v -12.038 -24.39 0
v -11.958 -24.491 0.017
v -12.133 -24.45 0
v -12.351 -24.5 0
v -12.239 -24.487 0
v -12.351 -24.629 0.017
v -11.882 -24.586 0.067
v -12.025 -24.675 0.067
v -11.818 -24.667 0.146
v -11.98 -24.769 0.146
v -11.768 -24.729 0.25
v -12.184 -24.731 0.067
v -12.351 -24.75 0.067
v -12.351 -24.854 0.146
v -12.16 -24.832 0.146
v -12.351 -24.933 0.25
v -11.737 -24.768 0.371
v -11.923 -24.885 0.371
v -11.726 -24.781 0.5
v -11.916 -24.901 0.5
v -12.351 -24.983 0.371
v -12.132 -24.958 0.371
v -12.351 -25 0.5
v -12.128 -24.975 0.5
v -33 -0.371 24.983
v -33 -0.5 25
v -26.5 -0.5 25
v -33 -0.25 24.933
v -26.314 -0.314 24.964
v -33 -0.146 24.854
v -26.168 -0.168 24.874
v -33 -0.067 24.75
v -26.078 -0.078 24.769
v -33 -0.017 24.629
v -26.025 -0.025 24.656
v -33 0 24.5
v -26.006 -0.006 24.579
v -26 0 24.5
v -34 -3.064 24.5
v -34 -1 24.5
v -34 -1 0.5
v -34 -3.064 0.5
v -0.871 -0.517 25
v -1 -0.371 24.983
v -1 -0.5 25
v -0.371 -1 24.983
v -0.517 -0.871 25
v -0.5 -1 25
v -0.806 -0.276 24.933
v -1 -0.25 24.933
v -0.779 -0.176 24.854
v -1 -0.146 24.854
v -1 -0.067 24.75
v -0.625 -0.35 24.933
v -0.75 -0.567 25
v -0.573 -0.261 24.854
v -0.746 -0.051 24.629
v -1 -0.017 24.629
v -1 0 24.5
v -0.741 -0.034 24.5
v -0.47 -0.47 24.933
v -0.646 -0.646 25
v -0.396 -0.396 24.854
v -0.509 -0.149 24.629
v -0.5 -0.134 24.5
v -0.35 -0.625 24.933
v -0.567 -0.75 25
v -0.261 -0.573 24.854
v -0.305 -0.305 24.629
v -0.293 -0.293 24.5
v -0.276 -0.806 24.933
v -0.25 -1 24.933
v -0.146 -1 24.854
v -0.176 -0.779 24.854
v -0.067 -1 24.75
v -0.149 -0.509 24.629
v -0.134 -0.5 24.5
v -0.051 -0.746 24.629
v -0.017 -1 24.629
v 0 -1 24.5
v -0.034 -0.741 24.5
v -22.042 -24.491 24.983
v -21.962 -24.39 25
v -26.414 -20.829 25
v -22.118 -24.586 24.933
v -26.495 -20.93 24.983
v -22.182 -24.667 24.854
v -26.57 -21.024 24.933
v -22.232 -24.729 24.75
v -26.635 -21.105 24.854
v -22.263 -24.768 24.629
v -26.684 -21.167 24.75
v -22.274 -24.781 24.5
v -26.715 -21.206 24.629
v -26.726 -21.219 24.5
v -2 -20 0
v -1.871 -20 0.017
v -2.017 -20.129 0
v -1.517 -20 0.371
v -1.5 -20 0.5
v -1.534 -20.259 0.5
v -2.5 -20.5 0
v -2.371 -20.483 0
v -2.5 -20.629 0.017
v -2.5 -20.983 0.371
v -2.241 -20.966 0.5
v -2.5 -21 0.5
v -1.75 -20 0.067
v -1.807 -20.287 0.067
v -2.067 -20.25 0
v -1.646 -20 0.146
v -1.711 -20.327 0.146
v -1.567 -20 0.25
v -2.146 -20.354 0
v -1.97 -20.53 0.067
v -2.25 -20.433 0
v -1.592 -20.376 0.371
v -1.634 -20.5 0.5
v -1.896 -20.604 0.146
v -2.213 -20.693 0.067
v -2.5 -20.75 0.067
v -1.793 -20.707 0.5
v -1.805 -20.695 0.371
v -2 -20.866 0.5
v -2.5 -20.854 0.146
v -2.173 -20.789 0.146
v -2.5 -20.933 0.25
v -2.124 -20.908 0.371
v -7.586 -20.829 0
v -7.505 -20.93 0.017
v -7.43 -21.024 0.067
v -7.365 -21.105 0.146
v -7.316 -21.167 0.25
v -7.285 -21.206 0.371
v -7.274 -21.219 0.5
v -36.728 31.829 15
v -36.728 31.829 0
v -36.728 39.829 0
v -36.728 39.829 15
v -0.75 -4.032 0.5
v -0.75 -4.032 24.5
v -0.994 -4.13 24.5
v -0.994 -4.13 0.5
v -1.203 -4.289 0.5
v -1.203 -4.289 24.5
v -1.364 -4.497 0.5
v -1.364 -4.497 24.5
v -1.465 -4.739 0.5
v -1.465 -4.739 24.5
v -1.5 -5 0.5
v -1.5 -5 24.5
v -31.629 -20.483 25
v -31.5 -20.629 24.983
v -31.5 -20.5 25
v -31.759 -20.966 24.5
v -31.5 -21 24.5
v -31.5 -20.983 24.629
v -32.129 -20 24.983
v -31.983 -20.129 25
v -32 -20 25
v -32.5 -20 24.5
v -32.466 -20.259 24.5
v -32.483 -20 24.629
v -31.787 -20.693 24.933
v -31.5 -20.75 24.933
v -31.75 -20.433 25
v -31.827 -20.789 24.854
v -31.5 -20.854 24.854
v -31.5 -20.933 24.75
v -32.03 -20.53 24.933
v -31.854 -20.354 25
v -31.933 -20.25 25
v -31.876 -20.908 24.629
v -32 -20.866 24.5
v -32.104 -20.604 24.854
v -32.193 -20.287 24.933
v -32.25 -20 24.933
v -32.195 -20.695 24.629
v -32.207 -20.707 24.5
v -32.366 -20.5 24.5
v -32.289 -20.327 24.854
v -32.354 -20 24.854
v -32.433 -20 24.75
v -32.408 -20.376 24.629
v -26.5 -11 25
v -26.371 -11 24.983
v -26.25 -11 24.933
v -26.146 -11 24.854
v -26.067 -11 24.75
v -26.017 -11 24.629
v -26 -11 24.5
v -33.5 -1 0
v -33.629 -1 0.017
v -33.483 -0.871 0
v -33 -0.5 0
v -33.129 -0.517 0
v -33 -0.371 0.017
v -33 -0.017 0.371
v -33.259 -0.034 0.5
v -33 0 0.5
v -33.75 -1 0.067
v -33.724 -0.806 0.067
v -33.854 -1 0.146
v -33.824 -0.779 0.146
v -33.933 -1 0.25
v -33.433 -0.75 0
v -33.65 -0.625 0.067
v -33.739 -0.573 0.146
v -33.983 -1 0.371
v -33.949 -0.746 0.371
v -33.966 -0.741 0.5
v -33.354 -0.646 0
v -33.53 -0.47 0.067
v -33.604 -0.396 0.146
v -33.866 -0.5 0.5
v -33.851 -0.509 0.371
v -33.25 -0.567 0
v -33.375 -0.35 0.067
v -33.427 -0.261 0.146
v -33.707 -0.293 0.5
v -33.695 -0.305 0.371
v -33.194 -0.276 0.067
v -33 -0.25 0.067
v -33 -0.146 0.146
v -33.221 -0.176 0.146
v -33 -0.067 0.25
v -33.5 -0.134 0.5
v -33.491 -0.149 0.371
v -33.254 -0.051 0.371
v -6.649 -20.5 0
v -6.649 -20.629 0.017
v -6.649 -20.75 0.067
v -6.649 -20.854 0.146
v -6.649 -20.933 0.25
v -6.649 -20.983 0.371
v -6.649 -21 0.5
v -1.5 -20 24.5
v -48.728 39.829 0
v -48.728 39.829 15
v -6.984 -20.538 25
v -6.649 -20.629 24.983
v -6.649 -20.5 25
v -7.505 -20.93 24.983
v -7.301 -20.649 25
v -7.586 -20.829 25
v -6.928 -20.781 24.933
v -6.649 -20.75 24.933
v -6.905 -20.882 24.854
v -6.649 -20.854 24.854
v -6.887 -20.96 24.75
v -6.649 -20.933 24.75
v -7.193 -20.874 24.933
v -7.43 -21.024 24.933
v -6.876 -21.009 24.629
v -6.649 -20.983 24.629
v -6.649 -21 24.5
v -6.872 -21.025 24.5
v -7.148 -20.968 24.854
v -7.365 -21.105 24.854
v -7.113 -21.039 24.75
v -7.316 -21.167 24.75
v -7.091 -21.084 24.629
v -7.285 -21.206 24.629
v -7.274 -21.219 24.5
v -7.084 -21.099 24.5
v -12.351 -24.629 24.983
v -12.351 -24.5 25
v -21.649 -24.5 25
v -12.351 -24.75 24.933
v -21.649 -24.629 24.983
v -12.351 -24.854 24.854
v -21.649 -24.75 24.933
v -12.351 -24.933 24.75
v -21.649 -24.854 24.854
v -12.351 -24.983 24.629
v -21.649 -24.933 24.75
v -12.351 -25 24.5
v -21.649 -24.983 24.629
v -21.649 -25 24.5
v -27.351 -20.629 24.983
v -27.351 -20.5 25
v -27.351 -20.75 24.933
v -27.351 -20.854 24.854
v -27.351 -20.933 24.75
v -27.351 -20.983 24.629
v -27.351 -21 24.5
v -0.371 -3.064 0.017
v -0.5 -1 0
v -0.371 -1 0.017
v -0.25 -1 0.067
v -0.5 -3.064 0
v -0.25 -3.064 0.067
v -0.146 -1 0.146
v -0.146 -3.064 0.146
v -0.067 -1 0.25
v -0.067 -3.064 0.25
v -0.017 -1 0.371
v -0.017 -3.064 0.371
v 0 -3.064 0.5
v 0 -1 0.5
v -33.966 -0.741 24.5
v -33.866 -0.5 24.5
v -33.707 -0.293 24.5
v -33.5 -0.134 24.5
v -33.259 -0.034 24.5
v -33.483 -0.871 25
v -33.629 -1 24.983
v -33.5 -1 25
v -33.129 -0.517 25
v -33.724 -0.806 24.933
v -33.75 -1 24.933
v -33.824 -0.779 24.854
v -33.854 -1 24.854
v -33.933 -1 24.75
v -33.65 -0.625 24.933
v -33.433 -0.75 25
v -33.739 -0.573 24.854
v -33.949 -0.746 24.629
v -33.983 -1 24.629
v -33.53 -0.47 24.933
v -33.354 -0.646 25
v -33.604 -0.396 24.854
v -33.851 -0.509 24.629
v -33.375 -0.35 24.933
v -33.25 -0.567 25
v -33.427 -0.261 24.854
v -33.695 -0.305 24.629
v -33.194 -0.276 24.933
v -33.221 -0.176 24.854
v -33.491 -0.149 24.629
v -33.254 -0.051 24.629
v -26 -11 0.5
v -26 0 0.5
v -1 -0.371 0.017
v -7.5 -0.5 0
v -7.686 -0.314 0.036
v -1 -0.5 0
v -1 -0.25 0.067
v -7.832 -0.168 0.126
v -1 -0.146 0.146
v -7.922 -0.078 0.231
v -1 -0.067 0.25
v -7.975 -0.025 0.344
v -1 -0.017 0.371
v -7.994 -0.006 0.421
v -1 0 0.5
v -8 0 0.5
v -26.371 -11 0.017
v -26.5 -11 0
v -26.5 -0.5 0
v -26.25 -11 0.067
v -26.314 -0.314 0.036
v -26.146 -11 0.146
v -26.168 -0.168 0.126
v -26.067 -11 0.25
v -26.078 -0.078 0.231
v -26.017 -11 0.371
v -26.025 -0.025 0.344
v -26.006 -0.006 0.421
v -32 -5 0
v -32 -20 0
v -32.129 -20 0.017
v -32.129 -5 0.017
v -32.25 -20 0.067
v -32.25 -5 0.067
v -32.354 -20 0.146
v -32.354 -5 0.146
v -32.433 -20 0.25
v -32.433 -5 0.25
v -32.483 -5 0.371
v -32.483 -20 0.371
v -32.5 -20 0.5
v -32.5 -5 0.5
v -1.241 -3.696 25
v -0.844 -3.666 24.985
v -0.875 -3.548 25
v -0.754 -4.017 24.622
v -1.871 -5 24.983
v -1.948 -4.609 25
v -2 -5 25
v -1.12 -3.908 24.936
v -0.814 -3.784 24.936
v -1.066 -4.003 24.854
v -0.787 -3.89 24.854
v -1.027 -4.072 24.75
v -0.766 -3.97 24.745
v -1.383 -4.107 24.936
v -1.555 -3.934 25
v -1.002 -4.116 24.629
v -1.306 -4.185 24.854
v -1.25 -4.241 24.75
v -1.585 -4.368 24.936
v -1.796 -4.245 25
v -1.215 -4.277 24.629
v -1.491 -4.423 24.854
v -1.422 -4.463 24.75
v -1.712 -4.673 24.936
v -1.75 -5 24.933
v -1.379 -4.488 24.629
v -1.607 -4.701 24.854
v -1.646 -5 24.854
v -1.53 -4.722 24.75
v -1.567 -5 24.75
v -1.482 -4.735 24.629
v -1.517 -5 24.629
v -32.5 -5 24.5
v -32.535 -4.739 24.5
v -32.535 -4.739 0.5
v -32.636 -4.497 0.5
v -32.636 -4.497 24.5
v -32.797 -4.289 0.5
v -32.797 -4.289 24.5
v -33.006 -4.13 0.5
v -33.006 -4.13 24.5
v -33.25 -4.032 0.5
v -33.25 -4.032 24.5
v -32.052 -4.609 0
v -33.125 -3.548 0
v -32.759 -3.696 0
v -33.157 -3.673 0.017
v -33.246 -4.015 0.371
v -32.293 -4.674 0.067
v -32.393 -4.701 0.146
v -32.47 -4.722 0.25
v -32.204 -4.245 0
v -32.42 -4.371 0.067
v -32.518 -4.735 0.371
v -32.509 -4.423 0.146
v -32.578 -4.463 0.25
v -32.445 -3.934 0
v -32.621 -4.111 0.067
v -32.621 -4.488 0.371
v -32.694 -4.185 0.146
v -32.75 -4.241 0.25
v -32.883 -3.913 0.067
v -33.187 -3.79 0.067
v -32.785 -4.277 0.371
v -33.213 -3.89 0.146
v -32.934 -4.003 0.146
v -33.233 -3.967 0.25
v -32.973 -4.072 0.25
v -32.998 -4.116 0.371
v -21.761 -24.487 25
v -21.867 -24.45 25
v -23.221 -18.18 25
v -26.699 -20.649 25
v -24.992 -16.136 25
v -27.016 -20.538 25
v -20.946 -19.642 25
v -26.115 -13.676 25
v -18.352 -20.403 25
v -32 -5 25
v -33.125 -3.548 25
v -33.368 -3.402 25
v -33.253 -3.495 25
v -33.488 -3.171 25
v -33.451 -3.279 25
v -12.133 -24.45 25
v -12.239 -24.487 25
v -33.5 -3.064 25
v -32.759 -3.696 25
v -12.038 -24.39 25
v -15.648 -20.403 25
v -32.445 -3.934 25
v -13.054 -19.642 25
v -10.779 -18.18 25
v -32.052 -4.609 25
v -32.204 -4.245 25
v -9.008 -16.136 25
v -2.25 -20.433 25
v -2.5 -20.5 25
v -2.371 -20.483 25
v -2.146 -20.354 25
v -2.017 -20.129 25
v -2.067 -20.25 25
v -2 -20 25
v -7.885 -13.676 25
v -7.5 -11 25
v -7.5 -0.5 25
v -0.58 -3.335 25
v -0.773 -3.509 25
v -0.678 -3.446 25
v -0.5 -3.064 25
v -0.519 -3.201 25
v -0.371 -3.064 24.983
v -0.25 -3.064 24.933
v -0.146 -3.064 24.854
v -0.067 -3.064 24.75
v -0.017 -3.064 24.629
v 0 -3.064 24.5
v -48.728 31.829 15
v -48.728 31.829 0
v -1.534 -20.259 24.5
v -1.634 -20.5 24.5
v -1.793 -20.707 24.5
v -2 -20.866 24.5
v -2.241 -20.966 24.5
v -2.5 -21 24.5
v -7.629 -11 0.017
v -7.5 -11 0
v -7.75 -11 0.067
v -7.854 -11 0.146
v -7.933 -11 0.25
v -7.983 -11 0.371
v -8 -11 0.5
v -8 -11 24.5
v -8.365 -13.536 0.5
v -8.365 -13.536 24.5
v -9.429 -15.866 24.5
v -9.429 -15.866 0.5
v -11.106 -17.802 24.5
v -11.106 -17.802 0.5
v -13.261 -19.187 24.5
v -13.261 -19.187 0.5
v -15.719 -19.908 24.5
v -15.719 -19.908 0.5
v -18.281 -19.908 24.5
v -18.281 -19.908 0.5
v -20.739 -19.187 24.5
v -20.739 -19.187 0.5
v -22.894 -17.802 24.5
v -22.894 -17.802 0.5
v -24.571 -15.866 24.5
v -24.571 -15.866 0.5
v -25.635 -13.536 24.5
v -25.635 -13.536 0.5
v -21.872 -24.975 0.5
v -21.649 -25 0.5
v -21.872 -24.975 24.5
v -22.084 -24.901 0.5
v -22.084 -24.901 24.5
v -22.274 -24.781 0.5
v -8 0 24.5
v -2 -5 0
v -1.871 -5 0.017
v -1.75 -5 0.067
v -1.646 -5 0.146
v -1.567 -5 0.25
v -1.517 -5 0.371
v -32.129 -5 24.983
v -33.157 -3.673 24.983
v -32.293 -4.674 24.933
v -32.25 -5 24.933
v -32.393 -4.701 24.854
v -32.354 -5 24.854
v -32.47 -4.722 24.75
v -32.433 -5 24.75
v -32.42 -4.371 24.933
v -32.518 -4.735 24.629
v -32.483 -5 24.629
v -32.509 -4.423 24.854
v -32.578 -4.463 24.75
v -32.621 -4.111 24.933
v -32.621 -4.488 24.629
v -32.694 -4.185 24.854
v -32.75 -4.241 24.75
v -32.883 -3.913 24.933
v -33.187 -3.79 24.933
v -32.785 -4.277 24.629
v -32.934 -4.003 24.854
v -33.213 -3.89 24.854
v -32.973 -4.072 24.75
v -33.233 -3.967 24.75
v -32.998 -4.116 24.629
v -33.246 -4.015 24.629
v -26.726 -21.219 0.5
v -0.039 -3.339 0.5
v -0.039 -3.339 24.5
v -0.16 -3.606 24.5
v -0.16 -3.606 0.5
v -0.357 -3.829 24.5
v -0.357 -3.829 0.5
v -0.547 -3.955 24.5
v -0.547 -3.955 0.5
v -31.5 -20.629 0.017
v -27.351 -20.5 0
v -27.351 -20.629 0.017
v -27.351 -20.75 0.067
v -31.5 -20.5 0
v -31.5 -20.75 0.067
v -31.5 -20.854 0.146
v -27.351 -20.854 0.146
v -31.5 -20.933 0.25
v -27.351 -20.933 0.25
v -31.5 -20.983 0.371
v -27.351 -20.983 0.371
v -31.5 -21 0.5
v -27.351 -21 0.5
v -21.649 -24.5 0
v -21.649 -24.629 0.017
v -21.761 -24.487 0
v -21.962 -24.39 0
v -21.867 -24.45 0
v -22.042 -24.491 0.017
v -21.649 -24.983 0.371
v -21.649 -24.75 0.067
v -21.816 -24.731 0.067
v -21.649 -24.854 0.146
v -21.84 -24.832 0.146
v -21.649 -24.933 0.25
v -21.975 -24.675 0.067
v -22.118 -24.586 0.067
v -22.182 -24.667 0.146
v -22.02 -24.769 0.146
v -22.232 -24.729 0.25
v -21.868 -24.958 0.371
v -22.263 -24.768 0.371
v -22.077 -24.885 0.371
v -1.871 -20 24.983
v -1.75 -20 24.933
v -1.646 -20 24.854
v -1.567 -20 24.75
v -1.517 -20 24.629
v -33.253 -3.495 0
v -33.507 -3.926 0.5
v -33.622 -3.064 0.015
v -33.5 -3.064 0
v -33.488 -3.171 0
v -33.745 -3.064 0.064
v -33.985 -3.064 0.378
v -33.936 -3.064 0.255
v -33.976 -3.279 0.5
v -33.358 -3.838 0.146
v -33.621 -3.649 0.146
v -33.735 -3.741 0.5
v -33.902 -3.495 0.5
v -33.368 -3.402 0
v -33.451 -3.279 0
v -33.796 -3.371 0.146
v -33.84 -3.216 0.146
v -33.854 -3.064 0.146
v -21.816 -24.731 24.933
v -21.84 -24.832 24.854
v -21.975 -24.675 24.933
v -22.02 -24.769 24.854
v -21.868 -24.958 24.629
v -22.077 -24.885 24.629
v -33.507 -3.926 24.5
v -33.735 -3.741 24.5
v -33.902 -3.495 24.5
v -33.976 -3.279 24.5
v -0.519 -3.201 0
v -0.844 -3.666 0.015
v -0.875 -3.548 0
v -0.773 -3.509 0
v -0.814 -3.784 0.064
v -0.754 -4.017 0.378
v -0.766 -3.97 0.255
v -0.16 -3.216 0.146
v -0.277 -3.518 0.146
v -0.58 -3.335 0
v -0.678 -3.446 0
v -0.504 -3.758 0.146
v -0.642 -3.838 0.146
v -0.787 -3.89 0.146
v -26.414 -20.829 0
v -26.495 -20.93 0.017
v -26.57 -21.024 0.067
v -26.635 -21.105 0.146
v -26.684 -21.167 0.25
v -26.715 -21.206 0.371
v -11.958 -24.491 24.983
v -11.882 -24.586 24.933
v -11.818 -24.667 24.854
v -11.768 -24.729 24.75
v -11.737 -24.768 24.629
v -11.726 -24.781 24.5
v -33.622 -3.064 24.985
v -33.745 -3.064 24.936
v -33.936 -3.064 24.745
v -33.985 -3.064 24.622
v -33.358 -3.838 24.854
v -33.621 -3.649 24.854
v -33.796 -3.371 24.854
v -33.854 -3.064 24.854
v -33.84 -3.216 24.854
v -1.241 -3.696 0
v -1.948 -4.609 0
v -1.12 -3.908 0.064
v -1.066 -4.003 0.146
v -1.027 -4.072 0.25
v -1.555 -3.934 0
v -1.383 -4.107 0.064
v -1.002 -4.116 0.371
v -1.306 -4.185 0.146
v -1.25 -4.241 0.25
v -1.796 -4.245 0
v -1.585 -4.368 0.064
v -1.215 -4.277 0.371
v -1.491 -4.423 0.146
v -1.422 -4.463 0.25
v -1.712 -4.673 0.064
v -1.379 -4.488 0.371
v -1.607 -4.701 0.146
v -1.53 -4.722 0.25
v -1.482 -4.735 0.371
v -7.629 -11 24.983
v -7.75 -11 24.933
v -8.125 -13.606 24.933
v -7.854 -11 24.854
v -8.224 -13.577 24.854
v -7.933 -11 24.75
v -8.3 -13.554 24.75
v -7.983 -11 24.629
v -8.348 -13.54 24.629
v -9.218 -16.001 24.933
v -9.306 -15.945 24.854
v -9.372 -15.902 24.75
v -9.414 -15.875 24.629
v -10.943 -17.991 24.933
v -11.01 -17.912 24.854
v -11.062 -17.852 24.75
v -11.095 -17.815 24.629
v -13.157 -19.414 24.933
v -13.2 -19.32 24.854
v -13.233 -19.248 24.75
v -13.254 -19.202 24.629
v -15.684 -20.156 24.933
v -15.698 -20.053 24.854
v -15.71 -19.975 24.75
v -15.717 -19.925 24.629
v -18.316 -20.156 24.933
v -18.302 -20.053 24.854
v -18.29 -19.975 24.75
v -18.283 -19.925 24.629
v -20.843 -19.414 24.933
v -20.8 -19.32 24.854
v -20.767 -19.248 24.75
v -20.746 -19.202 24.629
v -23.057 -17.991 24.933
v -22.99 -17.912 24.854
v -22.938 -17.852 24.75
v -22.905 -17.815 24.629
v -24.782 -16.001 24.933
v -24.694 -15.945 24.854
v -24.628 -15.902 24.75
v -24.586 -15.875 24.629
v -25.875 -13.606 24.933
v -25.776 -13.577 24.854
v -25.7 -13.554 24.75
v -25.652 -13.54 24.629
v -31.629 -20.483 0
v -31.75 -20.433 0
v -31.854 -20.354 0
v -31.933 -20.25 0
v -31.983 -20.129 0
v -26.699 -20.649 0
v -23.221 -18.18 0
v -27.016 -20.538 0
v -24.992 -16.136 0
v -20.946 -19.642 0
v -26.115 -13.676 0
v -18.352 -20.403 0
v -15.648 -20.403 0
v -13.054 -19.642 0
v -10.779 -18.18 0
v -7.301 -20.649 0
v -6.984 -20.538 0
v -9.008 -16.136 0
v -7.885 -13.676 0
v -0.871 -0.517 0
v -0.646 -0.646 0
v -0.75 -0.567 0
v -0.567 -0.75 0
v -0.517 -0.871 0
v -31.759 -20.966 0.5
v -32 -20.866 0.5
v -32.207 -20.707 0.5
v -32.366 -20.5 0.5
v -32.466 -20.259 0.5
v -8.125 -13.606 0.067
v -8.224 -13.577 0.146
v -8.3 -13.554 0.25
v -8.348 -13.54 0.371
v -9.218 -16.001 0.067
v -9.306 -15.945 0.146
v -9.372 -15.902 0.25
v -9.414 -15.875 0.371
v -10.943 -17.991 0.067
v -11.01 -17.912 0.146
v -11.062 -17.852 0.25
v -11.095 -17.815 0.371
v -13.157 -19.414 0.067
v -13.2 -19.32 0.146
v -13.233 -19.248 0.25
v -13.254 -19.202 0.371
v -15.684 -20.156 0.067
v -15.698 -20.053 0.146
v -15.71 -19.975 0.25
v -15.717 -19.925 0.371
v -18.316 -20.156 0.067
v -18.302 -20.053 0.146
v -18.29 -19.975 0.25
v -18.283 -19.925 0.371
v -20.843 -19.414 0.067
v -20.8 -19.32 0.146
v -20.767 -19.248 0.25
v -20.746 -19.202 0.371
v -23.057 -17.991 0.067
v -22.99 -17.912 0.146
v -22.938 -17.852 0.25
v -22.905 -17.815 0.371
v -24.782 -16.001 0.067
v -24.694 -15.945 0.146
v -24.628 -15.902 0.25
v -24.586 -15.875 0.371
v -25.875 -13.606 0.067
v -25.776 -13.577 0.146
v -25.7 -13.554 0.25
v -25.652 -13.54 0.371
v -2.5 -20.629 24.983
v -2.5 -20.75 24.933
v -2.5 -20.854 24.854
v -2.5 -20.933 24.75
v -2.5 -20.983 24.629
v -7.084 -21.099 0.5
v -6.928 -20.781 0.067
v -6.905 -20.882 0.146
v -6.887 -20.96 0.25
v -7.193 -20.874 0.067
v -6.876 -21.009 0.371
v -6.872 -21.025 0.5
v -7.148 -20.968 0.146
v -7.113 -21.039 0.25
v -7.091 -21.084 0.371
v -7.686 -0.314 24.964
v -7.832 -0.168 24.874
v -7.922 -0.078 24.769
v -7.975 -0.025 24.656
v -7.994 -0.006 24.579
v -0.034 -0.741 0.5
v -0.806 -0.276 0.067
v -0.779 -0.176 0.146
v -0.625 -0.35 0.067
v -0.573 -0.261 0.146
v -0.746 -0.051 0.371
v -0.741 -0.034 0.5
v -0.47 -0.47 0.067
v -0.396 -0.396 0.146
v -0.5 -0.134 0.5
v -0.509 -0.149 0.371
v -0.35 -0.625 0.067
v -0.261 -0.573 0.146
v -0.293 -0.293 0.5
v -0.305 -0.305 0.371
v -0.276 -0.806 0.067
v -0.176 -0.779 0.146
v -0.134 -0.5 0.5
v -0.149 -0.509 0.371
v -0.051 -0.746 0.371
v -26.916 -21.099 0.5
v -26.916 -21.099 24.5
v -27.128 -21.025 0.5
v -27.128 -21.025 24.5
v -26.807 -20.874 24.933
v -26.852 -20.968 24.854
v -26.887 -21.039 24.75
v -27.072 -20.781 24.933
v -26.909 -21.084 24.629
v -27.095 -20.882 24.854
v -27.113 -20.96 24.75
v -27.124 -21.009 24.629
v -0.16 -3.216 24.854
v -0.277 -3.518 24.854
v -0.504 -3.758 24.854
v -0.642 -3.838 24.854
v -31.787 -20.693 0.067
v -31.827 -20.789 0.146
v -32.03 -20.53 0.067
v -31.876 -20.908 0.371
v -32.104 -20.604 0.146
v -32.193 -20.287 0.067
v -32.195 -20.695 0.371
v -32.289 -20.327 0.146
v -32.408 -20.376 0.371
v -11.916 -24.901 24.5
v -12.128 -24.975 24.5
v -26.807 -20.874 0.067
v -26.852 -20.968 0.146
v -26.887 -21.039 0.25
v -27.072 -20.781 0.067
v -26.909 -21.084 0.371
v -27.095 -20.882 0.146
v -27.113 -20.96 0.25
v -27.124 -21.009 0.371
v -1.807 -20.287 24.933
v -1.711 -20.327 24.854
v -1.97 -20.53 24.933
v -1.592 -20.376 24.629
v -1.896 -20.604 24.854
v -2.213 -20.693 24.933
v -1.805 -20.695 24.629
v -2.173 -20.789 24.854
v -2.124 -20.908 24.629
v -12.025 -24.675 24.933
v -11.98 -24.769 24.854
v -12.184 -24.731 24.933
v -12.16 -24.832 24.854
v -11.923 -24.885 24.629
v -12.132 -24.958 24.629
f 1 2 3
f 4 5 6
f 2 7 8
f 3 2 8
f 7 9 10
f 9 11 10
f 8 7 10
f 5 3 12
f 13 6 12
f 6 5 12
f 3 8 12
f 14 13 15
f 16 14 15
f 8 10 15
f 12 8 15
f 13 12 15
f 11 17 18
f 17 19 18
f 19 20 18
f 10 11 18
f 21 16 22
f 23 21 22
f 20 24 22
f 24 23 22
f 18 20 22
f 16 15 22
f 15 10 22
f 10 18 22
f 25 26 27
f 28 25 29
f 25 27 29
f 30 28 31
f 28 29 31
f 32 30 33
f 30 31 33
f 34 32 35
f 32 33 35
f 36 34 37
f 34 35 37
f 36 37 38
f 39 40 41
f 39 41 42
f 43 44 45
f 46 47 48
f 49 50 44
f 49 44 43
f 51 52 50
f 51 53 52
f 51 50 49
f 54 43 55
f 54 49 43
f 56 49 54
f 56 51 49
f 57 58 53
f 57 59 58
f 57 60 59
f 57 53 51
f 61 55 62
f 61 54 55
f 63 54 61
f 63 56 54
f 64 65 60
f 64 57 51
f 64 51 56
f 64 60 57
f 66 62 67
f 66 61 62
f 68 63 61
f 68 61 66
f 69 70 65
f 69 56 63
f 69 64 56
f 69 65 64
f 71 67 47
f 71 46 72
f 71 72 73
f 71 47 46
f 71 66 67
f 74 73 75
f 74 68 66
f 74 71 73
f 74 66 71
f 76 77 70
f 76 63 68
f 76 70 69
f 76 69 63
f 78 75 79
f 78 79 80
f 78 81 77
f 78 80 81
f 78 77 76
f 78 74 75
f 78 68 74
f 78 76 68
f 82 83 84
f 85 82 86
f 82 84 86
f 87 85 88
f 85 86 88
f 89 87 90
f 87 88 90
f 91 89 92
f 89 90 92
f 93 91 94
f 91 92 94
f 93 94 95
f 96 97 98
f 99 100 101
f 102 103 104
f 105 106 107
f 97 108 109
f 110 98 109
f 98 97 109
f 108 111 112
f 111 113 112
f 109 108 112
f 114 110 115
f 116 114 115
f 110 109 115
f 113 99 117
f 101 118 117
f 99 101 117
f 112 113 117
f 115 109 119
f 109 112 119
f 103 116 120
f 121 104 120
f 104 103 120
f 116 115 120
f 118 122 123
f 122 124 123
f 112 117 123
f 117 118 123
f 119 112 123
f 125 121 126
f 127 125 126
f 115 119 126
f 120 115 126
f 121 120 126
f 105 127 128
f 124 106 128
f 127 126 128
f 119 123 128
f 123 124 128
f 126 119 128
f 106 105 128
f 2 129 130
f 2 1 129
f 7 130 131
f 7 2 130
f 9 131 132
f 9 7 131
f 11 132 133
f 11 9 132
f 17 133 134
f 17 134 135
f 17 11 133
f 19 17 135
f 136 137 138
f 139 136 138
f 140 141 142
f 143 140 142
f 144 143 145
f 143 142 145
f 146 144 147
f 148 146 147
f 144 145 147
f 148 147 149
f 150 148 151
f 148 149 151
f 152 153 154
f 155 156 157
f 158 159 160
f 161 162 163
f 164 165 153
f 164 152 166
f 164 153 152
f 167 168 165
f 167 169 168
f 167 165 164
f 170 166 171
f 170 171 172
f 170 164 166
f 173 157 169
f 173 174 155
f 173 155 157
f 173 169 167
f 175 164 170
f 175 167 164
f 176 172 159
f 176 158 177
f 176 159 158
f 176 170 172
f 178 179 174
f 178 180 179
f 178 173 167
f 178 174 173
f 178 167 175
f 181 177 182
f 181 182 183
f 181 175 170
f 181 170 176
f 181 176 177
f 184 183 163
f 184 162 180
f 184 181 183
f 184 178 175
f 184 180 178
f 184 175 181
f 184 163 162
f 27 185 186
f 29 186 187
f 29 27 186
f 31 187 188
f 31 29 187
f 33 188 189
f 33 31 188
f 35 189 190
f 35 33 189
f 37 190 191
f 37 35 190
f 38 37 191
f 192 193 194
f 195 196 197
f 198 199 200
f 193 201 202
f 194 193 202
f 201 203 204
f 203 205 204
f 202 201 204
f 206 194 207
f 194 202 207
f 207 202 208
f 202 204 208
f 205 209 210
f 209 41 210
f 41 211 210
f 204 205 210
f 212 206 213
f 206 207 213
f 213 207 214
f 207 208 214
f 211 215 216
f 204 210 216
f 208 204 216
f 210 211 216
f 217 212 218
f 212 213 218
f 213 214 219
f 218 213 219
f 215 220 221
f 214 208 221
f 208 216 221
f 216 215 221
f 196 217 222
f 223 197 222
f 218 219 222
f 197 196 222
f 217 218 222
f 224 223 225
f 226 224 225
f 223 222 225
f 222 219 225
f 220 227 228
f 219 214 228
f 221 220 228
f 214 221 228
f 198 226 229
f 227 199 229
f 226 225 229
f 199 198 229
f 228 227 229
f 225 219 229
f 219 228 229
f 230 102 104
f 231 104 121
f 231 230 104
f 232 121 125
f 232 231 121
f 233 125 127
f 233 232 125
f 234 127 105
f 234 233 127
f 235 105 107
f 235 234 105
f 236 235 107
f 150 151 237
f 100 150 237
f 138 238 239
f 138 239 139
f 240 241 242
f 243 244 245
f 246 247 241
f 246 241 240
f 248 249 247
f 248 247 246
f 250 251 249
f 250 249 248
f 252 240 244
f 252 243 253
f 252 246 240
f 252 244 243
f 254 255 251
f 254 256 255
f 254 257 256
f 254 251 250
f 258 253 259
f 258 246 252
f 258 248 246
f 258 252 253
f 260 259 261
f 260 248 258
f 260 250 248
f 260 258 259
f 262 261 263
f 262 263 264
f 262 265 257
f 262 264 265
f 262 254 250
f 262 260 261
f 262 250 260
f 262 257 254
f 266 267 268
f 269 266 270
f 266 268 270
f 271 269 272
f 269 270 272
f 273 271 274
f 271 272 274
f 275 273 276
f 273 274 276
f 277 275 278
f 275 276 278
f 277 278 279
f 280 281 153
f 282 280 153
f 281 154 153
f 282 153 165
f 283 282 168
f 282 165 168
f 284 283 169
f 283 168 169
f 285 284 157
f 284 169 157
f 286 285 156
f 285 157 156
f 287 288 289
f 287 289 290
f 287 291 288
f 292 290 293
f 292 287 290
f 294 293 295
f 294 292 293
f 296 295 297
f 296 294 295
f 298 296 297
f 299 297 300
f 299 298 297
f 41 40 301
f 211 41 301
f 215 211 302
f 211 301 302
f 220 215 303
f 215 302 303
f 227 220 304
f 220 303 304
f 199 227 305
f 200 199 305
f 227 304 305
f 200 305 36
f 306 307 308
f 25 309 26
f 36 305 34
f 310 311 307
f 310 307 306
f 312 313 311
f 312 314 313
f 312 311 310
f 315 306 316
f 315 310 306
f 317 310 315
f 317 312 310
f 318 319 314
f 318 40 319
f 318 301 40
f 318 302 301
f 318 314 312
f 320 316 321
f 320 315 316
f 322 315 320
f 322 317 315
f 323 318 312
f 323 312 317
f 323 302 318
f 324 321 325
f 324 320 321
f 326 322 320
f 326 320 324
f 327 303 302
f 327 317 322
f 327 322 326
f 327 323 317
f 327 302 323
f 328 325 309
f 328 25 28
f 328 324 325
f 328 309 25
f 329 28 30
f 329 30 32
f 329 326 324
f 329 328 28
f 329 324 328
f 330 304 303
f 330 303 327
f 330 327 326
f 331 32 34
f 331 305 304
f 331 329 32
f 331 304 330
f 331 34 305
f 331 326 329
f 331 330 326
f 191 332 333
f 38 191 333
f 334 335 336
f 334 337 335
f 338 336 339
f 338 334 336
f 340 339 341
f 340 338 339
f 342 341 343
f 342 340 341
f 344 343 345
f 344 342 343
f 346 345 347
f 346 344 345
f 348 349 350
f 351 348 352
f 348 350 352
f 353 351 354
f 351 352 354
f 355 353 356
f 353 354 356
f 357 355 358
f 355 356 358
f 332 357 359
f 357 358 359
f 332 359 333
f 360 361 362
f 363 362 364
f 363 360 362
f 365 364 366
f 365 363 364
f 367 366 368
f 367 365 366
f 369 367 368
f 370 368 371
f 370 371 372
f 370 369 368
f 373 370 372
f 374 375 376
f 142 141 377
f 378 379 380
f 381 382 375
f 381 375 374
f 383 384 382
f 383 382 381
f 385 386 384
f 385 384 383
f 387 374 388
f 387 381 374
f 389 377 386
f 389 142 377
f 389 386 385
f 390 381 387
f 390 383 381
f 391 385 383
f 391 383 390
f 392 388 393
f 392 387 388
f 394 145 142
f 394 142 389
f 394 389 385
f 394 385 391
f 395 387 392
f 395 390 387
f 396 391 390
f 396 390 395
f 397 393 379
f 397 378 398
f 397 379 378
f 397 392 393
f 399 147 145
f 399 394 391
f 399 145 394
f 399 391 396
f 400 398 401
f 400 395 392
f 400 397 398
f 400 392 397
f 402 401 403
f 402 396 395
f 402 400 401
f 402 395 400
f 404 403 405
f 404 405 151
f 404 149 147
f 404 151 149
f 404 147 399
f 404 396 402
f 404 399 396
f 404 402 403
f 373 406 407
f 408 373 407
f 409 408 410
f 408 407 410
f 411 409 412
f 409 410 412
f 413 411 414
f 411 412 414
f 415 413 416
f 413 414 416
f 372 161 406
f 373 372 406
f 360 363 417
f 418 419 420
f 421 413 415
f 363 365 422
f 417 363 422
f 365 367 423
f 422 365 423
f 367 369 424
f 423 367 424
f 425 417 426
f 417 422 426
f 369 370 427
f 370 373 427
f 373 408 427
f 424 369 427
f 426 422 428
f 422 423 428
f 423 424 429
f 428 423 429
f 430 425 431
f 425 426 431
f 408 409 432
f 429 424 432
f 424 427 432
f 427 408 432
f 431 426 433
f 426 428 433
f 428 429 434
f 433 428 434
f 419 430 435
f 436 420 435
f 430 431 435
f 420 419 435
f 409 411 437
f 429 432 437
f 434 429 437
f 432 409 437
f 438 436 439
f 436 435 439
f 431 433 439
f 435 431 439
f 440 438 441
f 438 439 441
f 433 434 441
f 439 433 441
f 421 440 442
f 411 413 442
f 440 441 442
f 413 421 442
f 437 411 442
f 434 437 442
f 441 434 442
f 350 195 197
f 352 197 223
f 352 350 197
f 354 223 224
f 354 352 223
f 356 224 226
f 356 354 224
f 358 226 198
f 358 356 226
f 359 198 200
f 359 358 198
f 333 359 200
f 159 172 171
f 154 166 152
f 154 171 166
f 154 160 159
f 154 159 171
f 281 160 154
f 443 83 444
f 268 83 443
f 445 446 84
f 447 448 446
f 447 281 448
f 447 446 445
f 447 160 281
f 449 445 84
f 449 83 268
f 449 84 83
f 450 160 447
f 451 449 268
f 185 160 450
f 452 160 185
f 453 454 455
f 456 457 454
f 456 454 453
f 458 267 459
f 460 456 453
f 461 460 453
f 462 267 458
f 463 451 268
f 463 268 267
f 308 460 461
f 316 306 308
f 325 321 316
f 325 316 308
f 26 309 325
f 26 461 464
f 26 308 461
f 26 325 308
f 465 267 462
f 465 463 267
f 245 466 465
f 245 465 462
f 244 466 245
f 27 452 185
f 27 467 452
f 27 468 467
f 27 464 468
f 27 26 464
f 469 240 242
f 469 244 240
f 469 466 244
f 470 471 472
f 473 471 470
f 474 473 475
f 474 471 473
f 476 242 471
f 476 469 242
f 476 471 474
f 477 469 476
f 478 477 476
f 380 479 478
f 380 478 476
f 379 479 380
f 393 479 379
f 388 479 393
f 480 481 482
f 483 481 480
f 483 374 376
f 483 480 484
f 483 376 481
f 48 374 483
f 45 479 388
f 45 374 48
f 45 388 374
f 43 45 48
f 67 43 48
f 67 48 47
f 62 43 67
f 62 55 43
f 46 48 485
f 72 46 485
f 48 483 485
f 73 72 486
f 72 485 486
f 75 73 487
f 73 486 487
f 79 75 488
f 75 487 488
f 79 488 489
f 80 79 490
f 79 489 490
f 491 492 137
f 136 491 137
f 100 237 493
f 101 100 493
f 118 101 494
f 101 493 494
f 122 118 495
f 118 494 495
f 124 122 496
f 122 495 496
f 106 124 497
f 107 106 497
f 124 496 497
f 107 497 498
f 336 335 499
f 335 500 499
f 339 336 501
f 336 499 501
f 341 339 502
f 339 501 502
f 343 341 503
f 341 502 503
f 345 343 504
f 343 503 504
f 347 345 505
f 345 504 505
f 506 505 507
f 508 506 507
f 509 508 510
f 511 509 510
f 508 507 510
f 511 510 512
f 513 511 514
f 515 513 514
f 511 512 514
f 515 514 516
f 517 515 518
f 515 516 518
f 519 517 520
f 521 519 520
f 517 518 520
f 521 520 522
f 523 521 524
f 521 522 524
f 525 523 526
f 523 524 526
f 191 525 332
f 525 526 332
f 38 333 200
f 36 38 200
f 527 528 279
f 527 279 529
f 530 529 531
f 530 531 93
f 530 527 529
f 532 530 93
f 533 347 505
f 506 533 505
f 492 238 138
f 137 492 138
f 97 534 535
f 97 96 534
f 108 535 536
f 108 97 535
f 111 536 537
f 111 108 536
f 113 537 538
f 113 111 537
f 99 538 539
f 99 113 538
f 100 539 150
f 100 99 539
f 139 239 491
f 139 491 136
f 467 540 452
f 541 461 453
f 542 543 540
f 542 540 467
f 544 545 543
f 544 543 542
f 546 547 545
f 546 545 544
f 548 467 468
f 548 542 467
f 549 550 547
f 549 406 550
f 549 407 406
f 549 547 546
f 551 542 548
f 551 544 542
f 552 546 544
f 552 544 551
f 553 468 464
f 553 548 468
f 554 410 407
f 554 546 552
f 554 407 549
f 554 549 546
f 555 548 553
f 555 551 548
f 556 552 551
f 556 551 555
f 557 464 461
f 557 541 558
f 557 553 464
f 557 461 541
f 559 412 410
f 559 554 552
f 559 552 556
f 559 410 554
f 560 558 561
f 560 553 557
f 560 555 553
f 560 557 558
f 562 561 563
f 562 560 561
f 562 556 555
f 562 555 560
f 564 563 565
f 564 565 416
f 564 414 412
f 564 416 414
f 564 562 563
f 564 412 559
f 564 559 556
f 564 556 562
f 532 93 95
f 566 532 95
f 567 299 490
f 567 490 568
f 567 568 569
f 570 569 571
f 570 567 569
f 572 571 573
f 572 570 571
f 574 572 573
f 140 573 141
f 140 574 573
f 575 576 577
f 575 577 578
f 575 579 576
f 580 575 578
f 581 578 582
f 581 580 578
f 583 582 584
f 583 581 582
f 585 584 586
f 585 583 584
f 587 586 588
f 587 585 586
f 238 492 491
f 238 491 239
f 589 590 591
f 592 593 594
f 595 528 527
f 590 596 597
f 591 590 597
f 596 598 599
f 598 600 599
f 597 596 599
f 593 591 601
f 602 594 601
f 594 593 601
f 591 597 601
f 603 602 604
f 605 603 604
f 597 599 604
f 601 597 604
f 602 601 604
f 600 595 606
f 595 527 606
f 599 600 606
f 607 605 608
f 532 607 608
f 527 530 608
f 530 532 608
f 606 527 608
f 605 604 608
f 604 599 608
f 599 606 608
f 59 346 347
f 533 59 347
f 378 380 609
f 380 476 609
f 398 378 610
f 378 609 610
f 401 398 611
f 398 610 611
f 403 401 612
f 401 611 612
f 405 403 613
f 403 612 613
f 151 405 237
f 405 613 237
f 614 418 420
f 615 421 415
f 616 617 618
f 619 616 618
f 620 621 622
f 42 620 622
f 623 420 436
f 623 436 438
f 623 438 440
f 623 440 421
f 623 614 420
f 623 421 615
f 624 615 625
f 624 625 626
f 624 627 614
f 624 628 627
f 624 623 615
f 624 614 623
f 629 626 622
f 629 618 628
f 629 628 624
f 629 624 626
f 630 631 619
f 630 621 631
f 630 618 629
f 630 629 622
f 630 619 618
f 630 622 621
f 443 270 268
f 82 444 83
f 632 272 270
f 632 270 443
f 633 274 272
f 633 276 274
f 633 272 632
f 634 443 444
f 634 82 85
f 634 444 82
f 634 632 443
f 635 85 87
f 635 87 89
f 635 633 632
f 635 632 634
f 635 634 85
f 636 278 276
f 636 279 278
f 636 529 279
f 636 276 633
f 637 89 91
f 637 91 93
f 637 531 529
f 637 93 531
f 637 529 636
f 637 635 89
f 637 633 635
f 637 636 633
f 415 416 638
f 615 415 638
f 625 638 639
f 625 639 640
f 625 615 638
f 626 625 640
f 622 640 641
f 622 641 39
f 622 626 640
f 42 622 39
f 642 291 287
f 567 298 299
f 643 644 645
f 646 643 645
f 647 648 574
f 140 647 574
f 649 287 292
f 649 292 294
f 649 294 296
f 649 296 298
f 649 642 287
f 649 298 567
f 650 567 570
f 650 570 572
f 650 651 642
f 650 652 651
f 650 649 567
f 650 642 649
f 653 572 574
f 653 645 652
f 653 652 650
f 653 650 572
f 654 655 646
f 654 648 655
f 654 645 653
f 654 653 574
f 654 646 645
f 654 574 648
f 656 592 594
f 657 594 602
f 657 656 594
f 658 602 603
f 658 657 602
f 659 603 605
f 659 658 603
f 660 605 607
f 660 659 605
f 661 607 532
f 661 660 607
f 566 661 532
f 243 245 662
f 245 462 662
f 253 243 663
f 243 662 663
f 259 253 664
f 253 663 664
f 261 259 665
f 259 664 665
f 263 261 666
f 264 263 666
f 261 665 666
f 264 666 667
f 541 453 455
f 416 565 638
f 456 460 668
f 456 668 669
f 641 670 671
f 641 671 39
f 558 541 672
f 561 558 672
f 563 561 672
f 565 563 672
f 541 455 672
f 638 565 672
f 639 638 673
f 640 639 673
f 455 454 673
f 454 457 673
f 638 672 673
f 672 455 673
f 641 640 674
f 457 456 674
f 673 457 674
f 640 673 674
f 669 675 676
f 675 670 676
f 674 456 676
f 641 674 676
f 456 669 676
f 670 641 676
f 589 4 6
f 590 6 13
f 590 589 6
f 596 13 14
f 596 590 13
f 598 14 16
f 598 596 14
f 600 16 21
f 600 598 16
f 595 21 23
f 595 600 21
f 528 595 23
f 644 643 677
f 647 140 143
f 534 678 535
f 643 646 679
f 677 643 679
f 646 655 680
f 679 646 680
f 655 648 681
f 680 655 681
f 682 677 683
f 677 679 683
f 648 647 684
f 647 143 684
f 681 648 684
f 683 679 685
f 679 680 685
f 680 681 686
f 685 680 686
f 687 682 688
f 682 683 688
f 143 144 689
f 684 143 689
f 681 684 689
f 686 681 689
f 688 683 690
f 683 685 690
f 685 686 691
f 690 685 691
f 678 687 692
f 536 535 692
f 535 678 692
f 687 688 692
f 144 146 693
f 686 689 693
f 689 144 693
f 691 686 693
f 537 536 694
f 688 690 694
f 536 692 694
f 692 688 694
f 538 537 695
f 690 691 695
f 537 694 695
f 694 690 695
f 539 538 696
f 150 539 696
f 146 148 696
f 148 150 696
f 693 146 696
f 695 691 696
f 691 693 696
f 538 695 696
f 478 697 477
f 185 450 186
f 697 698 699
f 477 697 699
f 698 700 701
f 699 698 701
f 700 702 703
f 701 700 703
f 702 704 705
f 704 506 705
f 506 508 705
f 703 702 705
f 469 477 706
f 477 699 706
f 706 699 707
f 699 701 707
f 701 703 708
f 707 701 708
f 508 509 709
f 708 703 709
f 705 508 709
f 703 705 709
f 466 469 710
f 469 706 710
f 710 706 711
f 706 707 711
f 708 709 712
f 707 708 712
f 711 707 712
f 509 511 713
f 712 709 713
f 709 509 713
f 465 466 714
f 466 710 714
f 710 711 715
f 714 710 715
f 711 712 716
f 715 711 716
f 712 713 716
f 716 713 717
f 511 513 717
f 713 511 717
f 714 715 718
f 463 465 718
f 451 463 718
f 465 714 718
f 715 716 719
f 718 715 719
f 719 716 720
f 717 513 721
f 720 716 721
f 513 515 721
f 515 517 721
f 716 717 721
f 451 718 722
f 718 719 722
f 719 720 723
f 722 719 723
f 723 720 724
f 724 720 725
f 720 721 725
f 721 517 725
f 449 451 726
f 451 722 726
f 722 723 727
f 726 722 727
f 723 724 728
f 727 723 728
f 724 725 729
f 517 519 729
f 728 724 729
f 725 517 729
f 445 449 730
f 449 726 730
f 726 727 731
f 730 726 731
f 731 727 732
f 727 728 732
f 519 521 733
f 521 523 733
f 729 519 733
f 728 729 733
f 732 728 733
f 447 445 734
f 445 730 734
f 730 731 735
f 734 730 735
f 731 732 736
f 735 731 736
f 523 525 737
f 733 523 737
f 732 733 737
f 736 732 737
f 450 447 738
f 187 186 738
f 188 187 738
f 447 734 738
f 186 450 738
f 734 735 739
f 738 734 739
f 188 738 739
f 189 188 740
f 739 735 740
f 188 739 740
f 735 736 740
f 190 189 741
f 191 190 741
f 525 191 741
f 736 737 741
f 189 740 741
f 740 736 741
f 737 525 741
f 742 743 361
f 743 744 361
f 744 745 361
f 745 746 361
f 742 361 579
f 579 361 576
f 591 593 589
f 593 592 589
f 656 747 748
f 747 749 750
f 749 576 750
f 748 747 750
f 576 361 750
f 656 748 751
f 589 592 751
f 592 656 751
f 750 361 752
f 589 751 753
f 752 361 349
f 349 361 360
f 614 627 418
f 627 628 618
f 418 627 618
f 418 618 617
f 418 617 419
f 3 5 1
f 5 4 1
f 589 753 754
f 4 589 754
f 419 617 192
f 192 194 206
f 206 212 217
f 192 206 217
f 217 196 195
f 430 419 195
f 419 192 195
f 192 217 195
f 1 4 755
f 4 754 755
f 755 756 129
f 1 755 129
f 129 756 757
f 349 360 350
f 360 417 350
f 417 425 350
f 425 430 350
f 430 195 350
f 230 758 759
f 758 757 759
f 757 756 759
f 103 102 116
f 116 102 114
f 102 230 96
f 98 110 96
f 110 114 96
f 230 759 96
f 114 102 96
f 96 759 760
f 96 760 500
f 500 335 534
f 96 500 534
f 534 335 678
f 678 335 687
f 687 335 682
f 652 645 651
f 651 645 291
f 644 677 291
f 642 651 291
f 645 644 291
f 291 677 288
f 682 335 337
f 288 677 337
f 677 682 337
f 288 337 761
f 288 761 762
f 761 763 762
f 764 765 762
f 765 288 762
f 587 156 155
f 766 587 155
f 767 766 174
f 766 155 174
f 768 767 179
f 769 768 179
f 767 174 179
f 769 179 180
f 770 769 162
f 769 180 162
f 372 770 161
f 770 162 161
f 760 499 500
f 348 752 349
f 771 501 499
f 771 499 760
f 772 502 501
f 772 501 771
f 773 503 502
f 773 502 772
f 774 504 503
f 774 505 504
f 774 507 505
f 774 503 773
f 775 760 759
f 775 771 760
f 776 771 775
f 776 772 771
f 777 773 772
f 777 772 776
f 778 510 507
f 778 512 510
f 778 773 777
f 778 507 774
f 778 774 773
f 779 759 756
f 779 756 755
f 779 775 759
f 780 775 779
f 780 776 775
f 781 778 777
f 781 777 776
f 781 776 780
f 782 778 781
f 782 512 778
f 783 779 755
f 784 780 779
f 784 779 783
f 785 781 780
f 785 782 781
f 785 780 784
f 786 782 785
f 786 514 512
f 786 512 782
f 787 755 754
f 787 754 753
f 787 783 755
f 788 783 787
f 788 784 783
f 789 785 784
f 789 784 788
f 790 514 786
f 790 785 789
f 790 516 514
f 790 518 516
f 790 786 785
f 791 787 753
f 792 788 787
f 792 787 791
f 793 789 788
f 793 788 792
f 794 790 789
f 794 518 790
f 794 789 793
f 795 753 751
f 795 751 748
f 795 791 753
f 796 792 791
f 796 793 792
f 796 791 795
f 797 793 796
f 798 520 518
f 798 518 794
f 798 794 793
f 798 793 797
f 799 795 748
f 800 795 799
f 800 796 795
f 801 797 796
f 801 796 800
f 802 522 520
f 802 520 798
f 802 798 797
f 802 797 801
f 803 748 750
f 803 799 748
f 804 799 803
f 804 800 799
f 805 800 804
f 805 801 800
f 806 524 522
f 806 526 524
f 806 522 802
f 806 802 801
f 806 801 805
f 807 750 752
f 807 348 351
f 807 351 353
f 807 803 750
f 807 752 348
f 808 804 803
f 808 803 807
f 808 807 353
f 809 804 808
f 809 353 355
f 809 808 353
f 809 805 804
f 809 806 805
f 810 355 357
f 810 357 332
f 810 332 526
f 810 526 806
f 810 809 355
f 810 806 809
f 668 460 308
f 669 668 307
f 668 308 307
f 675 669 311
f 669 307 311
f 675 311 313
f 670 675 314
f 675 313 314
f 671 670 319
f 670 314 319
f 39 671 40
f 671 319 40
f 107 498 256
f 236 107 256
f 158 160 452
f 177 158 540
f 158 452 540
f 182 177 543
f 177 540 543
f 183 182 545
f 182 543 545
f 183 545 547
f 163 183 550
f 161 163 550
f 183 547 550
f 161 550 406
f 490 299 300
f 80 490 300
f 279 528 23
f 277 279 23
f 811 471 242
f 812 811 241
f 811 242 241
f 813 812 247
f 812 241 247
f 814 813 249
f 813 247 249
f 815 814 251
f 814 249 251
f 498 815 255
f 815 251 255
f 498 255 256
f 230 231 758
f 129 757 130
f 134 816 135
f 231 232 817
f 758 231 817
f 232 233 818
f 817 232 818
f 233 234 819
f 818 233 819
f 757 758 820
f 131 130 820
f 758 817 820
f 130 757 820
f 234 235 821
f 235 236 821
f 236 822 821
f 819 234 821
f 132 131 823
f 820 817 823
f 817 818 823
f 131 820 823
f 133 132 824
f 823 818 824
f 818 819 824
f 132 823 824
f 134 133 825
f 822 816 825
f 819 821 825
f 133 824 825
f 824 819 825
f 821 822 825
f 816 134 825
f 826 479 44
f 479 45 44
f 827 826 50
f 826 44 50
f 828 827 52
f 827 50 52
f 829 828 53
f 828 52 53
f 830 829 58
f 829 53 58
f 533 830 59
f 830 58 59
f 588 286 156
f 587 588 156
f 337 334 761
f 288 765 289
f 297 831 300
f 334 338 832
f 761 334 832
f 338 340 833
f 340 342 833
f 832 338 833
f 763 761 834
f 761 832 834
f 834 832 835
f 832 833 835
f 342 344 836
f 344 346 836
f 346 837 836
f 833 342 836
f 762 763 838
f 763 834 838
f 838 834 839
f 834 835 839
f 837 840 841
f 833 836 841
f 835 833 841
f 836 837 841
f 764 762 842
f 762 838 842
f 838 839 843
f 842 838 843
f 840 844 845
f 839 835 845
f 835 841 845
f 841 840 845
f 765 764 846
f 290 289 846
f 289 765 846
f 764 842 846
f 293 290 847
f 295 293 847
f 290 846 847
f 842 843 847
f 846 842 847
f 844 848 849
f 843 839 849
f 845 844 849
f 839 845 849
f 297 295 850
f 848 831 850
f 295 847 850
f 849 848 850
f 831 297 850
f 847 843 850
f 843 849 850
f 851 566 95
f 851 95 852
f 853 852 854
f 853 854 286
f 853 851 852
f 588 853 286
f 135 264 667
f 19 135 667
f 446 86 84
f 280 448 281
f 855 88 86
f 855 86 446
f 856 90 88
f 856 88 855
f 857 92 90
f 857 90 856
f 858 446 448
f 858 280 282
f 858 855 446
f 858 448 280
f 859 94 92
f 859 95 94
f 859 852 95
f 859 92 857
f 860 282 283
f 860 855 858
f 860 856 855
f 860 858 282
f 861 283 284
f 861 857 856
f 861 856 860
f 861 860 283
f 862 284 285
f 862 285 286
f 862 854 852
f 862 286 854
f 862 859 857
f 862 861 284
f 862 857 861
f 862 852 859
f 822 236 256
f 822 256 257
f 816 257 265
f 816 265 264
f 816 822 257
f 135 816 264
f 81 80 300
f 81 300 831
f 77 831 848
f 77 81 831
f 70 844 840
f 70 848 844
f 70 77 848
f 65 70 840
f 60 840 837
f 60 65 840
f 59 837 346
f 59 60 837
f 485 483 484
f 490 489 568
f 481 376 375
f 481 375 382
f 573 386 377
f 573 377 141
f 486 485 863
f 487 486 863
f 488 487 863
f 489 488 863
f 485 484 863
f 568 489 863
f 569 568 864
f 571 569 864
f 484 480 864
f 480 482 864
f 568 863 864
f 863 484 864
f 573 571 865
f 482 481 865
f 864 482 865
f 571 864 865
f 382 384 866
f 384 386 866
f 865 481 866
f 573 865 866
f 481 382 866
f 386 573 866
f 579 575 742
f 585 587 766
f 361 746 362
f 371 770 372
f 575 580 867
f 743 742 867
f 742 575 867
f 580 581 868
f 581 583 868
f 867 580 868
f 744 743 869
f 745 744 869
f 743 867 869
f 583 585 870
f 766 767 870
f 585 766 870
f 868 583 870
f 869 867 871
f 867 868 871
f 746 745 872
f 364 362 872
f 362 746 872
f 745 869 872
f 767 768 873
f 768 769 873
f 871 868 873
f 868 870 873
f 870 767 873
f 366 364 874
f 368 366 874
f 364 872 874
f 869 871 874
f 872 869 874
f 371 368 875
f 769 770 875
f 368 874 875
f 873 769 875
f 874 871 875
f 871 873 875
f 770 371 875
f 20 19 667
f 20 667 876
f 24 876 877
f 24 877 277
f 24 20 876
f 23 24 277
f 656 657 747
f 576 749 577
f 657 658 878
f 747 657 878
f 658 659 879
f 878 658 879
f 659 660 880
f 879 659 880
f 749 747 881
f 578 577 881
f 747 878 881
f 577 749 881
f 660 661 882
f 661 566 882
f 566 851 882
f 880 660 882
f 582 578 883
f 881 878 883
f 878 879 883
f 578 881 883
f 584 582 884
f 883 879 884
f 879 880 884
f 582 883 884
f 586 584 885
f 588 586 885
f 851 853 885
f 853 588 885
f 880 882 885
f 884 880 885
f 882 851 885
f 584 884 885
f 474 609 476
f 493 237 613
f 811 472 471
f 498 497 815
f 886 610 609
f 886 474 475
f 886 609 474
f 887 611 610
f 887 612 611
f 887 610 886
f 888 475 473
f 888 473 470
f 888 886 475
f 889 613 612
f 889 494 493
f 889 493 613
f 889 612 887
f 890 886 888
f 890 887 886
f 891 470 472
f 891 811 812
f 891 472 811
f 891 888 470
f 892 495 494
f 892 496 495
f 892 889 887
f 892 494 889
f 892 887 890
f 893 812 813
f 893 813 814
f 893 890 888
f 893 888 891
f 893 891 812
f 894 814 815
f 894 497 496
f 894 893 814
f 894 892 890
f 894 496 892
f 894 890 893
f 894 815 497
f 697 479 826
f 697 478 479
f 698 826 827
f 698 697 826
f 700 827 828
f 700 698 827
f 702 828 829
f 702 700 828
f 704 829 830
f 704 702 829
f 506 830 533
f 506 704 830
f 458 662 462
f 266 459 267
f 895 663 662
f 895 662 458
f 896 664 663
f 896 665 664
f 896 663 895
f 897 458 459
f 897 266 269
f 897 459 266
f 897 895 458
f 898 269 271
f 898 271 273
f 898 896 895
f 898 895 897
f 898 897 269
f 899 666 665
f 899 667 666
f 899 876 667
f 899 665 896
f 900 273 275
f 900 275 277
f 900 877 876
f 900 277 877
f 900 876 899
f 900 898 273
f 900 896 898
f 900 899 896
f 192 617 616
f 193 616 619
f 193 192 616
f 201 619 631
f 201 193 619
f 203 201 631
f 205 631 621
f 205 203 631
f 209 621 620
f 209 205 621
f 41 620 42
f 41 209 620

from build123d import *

# Parameters (mm, degrees)
F0_W     = 12
F0_H     = 8
F1_DEPTH = 15
F3_DEPTH = 25
F5_DEPTH = 25.001
F6_R     = 1
F7_R     = 0.5


with BuildPart() as f1:
    # F0 (on Top) → F1 (new body)
    with BuildSketch(Plane.XY):
        with Locations((-42.7278246284, 35.8294376655)):
            Rectangle(F0_W, F0_H)
    extrude(amount=F1_DEPTH)


with BuildPart() as f3:
    # F2 (on Top) → F3 (new body)
    with BuildSketch(Plane.XY):
        with BuildLine():
            Line((0, -25), (0, 0))
            Line((0, 0), (-8, 0))
            Line((-8, 0), (-8, -11))
            ThreePointArc((-8, -11), (-17, -20), (-26, -11))
            Line((-26, -11), (-26, 0))
            Line((-26, 0), (-34, 0))
            Line((-34, 0), (-34, -25))
            Line((-34, -25), (0, -25))
        make_face()
    extrude(amount=F3_DEPTH)

    # F4 (on face) → F5 (cut, through all)
    with BuildSketch(Plane.XY.offset(25)):
        with BuildLine():
            Line((-27, -21), (-31.5, -21))
            ThreePointArc((-31.5, -21), (-32.2071067812, -20.7071067812), (-32.5, -20))
            Line((-32.5, -20), (-32.5, -5))
            ThreePointArc((-32.5, -5), (-32.7928932188, -4.2928932188), (-33.5, -4))
            Line((-33.5, -4), (-34, -4))
            Line((-34, -4), (-34, -25))
            Line((-34, -25), (-22, -25))
            Line((-22, -25), (-27, -21))
        make_face()
        with BuildLine():
            Line((-7, -21), (-12, -25))
            Line((-12, -25), (0, -25))
            Line((0, -25), (0, -4))
            Line((0, -4), (-0.5, -4))
            ThreePointArc((-0.5, -4), (-1.2071067812, -4.2928932188), (-1.5, -5))
            Line((-1.5, -5), (-1.5, -20))
            ThreePointArc((-1.5, -20), (-1.7928932188, -20.7071067812), (-2.5, -21))
            Line((-2.5, -21), (-7, -21))
        make_face()
    extrude(amount=-F5_DEPTH, mode=Mode.SUBTRACT)

    # F6
    f6_edges = [f3.edges().sort_by_distance(p)[0] for p in [
        (-34, -4, 12.5),
        (0, -4, 12.5),
        (-12, -25, 12.5),
        (-7, -21, 12.5),
        (-27, -21, 12.5),
        (-22, -25, 12.5),
        (0, 0, 12.5),
        (-34, 0, 12.5),
    ]]
    fillet(f6_edges, radius=F6_R)

    # F7
    f7_edges = [f3.edges().sort_by_distance(p)[0] for p in [
        (-1.290569, -4.387628, 25),
        (-0.209431, -3.675881, 25),
        (-1.5, -12.5, 25),
        (0, -2.031754, 25),
        (-1.792893, -20.707107, 25),
        (-0.292893, -0.292893, 25),
        (-4.574609, -21, 25),
        (-4.5, 0, 25),
        (-6.980226, -21.056372, 25),
        (-8, -5.5, 25),
        (-9.5, -23, 25),
        (-17, -20, 25),
        (-12.019774, -24.943628, 25),
        (-26, -5.5, 25),
        (-17, -25, 25),
        (-29.5, 0, 25),
        (-21.980226, -24.943628, 25),
        (-33.707107, -0.292893, 25),
        (-24.5, -23, 25),
        (-34, -2.031754, 25),
        (-27.019774, -21.056372, 25),
        (-33.790569, -3.675881, 25),
        (-29.425391, -21, 25),
        (-32.709431, -4.387628, 25),
        (-32.207107, -20.707107, 25),
        (-32.5, -12.5, 25),
        (-1.290569, -4.387628, 0),
        (-0.209431, -3.675881, 0),
        (-1.5, -12.5, 0),
        (0, -2.031754, 0),
        (-1.792893, -20.707107, 0),
        (-0.292893, -0.292893, 0),
        (-4.574609, -21, 0),
        (-4.5, 0, 0),
        (-6.980226, -21.056372, 0),
        (-8, -5.5, 0),
        (-9.5, -23, 0),
        (-17, -20, 0),
        (-12.019774, -24.943628, 0),
        (-26, -5.5, 0),
        (-17, -25, 0),
        (-29.5, 0, 0),
        (-21.980226, -24.943628, 0),
        (-33.707107, -0.292893, 0),
        (-24.5, -23, 0),
        (-34, -2.031754, 0),
        (-27.019774, -21.056372, 0),
        (-33.790569, -3.675881, 0),
        (-29.425391, -21, 0),
        (-32.709431, -4.387628, 0),
        (-32.207107, -20.707107, 0),
        (-32.5, -12.5, 0),
    ]]
    fillet(f7_edges, radius=F7_R)


solid = Compound([f1.part, f3.part])
